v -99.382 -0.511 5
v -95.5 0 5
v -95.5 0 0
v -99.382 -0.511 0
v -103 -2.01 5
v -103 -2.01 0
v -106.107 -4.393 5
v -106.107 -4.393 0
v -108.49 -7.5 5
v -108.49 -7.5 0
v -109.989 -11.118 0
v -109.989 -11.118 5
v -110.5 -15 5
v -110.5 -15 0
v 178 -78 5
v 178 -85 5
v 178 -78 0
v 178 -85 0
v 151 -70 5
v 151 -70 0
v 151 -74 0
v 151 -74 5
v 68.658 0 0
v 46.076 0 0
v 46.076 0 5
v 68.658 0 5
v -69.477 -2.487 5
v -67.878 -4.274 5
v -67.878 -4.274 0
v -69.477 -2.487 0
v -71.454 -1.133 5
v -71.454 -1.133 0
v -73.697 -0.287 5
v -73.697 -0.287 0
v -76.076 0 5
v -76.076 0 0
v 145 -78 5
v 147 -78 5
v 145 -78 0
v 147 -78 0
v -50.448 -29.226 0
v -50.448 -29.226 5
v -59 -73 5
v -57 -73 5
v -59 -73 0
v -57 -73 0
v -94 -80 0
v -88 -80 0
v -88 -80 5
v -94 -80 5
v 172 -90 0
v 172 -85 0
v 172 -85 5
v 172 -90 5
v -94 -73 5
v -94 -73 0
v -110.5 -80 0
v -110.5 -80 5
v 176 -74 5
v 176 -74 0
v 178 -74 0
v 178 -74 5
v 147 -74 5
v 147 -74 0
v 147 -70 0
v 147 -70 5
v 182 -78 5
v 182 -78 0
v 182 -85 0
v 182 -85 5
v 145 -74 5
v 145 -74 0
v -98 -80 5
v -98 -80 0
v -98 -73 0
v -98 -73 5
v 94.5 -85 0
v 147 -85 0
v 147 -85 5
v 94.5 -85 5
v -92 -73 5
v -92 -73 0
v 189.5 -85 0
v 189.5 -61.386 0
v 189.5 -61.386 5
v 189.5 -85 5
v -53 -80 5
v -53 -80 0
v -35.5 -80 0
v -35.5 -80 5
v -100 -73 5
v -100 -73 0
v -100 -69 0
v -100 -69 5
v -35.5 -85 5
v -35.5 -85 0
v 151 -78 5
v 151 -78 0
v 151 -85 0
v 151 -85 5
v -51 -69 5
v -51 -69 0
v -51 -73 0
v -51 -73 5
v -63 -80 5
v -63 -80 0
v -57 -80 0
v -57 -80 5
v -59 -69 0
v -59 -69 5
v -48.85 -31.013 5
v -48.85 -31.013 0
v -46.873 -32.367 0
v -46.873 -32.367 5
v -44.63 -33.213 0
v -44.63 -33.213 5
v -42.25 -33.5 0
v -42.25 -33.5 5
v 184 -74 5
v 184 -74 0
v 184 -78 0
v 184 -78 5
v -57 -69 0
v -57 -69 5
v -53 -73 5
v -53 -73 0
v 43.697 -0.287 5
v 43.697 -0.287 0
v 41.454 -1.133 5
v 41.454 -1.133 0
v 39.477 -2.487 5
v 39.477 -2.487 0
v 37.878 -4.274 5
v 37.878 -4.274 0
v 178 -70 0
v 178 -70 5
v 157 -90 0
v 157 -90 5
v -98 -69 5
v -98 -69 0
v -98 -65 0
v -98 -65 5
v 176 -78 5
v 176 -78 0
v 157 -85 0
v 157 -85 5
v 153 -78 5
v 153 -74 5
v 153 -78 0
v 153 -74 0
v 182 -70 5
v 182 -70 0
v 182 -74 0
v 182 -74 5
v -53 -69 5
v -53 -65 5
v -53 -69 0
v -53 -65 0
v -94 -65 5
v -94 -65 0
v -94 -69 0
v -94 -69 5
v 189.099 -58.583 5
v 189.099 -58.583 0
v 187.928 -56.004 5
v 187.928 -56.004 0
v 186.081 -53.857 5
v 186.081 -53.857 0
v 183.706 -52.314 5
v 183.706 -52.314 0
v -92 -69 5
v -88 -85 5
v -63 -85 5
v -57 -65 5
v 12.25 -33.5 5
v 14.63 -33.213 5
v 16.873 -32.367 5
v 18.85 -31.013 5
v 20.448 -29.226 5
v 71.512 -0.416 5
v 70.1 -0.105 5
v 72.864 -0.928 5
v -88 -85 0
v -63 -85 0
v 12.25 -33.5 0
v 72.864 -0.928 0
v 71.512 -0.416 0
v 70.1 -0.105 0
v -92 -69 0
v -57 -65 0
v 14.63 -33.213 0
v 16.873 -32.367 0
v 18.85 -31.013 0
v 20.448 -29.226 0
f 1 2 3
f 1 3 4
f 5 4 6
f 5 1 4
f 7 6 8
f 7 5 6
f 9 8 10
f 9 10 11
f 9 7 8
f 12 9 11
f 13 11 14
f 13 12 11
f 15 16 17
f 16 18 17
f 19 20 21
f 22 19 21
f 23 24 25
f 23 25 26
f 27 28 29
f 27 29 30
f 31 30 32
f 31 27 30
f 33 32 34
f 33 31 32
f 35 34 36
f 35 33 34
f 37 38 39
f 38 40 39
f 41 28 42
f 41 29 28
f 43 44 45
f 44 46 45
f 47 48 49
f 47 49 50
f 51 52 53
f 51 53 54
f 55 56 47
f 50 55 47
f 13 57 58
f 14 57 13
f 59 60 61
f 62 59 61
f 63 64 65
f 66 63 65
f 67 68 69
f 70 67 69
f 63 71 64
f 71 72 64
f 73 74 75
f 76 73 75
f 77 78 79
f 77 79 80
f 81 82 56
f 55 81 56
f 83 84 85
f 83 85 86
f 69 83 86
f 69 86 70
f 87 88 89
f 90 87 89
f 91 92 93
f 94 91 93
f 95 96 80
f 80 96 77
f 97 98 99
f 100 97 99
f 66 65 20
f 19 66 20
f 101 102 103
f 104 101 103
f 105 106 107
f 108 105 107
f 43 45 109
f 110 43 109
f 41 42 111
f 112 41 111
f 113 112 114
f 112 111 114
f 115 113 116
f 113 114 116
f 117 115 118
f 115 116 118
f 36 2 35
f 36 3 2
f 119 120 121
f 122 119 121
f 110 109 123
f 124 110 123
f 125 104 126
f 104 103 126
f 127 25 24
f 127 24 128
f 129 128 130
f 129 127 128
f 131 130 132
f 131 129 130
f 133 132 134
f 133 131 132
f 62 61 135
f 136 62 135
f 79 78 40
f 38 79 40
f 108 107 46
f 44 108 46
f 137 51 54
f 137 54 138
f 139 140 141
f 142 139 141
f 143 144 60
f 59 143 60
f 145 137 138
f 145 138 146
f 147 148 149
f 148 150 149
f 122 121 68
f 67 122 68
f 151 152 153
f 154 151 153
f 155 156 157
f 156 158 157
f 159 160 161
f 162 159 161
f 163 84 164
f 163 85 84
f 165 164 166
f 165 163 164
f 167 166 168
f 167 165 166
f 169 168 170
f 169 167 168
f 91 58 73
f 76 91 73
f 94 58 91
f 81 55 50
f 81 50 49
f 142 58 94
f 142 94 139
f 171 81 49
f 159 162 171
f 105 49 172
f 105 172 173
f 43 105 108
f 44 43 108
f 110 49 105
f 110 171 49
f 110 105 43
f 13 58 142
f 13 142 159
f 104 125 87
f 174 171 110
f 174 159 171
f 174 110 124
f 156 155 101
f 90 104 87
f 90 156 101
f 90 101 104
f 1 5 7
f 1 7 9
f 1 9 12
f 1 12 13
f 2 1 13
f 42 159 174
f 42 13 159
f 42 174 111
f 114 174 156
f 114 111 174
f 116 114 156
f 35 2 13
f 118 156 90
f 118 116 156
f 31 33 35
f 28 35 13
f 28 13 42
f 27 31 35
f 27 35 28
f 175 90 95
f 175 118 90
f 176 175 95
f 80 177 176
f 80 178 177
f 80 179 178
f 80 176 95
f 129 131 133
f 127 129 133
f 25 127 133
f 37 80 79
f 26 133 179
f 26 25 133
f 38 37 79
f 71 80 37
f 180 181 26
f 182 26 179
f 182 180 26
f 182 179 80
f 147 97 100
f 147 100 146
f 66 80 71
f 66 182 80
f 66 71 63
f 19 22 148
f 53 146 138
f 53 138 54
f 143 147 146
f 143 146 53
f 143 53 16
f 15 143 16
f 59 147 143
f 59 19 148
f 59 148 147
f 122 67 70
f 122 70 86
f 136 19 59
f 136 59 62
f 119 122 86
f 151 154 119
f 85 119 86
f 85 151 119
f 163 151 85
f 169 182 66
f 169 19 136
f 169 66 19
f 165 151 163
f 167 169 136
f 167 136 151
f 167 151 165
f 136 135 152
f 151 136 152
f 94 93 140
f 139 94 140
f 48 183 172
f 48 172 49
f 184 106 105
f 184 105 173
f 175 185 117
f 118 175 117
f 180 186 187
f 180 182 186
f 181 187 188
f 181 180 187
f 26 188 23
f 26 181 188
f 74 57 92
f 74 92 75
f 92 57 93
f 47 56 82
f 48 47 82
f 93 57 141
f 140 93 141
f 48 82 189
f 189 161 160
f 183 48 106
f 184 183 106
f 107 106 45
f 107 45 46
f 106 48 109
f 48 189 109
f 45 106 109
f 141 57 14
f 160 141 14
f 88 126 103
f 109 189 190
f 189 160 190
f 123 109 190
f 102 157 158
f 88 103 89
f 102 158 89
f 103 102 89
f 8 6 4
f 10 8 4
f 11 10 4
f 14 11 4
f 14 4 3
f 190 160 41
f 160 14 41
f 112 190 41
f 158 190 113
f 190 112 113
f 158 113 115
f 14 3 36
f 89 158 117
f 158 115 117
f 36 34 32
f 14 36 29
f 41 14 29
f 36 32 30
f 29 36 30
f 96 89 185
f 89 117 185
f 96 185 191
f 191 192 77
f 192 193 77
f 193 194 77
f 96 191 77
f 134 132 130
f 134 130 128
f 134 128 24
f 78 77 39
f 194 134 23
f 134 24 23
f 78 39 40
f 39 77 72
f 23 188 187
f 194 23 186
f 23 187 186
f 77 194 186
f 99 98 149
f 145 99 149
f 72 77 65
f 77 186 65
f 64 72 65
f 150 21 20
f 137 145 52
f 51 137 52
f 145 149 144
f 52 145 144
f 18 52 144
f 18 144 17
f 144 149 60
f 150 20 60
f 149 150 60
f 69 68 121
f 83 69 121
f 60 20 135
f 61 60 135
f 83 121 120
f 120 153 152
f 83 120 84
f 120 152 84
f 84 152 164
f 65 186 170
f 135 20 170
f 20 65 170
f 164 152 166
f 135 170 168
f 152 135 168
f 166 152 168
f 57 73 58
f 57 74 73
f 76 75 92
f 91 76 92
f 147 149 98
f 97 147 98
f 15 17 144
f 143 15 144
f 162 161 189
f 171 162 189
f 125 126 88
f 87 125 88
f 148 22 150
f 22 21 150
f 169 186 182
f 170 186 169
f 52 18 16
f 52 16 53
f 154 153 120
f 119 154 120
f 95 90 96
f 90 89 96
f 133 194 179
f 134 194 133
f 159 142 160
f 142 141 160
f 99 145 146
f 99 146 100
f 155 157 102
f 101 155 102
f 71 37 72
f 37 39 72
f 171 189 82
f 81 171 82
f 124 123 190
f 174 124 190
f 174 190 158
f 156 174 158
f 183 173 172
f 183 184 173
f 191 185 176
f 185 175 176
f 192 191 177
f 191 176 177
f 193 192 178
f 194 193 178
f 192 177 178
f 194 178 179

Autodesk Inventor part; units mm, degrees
ref_plane "YZ Plane" through (0, 0, 0) normal (1, 0, 0) x (0, 1, 0)
ref_plane "XZ Plane" through (0, 0, 0) normal (0, 1, 0) x (-1, 0, 0)
ref_plane "XY Plane" through (0, 0, 0) normal (0, 0, 1) x (1, 0, 0)
sketch "Sketch1" plane through (0, 0, 0) normal (0, 0, 1) x (1, 0, 0)
  circle A0 centre (0, 0) radius 63.5 construction
  line L0 (0, 0) -> (-110.5, 0) construction
  line L1 (-110.5, 0) -> (-110.5, -80) construction
  line L2 (0, 0) -> (189.5, 0) construction
  line L3 (189.5, 0) -> (189.5, -85) construction
  line L4 (-88, -80) -> (-63, -80) construction
  line L5 (-63, -80) -> (-63, -85) construction
  line L6 (-63, -85) -> (-88, -85) construction
  line L7 (-88, -85) -> (-88, -80) construction
  line L8 (157, -85) -> (172, -85) construction
  line L9 (172, -85) -> (172, -90) construction
  line L10 (172, -90) -> (157, -90) construction
  line L11 (157, -90) -> (157, -85) construction
  circle A1 centre (0, 0) radius 33.5 construction
  line L12 (-35.5, -80) -> (134.5, -85) construction
  line L13 (0, 0) -> (0, -63.5) construction
  line L14 (-40.8636, 0) -> (0, -58.5) construction
  line L15 (40.8636, 0) -> (0, -58.5) construction
  line L16 (-63, -80) -> (-63, -85)
  line L17 (-63, -85) -> (-88, -85)
  line L18 (-88, -85) -> (-88, -80)
  line L19 (-110.5, -80) -> (-110.5, 0)
  line L20 (-110.5, 0) -> (-40.8636, 0) construction
  line L21 (-40.8636, 0) -> (0, -58.5) construction
  line L22 (0, -58.5) -> (40.8636, 0) construction
  line L23 (40.8636, 0) -> (189.5, 0) construction
  line L24 (189.5, 0) -> (189.5, -85) construction
  line L25 (172, -85) -> (172, -90)
  line L26 (172, -90) -> (157, -90)
  line L27 (157, -90) -> (157, -85)
  line L28 (-35.5, -80) -> (-35.5, -85)
  line L29 (-35.5, -85) -> (94.5, -85)
  line L30 (40.8636, 0) -> (70.8636, 0)
  line L31 (70.8636, 0) -> (189.5, -55)
  line L32 (189.5, -55) -> (189.5, -85)
  line L33 (151, -85) -> (145, -85) construction
  line L34 (172, -85) -> (178, -85) construction
  line L35 (151, -85) -> (149, -85) construction
  line L36 (147, -85) -> (147, -70) construction
  line L37 (147, -70) -> (151, -70) construction
  line L38 (151, -70) -> (151, -85) construction
  line L39 (149, -70) -> (149, -85) construction
  line L40 (145, -78) -> (153, -78) construction
  line L41 (153, -78) -> (153, -74) construction
  line L42 (153, -74) -> (145, -74) construction
  line L43 (145, -74) -> (145, -78) construction
  line L44 (145, -78) -> (153, -74) construction
  line L45 (153, -78) -> (145, -74) construction
  line L46 (180, -85) -> (182, -85) construction
  line L47 (182, -85) -> (182, -70) construction
  line L48 (182, -70) -> (178, -70) construction
  line L49 (178, -70) -> (178, -85) construction
  line L50 (180, -70) -> (180, -85) construction
  line L51 (184, -78) -> (176, -78) construction
  line L52 (176, -78) -> (176, -74) construction
  line L53 (176, -74) -> (184, -74) construction
  line L54 (184, -74) -> (184, -78) construction
  line L55 (184, -78) -> (176, -74) construction
  line L56 (176, -78) -> (184, -74) construction
  line L57 (147, -85) -> (147, -78) construction
  line L58 (147, -85) -> (147, -78)
  line L59 (147, -78) -> (145, -78)
  line L60 (145, -78) -> (145, -74)
  line L61 (145, -74) -> (147, -74)
  line L62 (147, -74) -> (147, -70)
  line L63 (147, -70) -> (151, -70)
  line L64 (151, -70) -> (151, -74)
  line L65 (151, -74) -> (153, -74)
  line L66 (153, -74) -> (153, -78)
  line L67 (153, -78) -> (151, -78)
  line L68 (151, -78) -> (151, -85)
  line L69 (147, -85) -> (134.5, -85) construction
  line L70 (157, -85) -> (151, -85)
  line L71 (147, -85) -> (94.5, -85)
  line L72 (178, -85) -> (178, -78)
  line L73 (178, -78) -> (176, -78)
  line L74 (176, -78) -> (176, -74)
  line L75 (176, -74) -> (178, -74)
  line L76 (178, -74) -> (178, -70)
  line L77 (178, -70) -> (182, -70)
  line L78 (182, -70) -> (182, -74)
  line L79 (182, -74) -> (184, -74)
  line L80 (184, -74) -> (184, -78)
  line L81 (184, -78) -> (182, -78)
  line L82 (182, -78) -> (182, -85)
  line L83 (189.5, -85) -> (180, -85) construction
  line L84 (178, -85) -> (149, -85) construction
  line L85 (189.5, -85) -> (182, -85)
  line L86 (178, -85) -> (172, -85)
  line L87 (-98, -80) -> (-98, -65) construction
  line L88 (-98, -65) -> (-94, -65) construction
  line L89 (-94, -65) -> (-94, -80) construction
  line L90 (-55, -80) -> (-53, -80) construction
  line L91 (-53, -80) -> (-53, -65) construction
  line L92 (-53, -65) -> (-57, -65) construction
  line L93 (-57, -65) -> (-57, -80) construction
  line L94 (-96, -65) -> (-96, -80) construction
  line L95 (-55, -65) -> (-55, -80) construction
  line L96 (-100, -73) -> (-92, -73) construction
  line L97 (-92, -73) -> (-92, -69) construction
  line L98 (-92, -69) -> (-100, -69) construction
  line L99 (-100, -69) -> (-100, -73) construction
  line L100 (-100, -73) -> (-92, -69) construction
  line L101 (-92, -73) -> (-100, -69) construction
  line L102 (-51, -73) -> (-59, -73) construction
  line L103 (-59, -73) -> (-59, -69) construction
  line L104 (-59, -69) -> (-51, -69) construction
  line L105 (-51, -69) -> (-51, -73) construction
  line L106 (-51, -73) -> (-59, -69) construction
  line L107 (-59, -73) -> (-51, -69) construction
  line L108 (-98, -80) -> (-98, -73)
  line L109 (-98, -73) -> (-100, -73)
  line L110 (-100, -73) -> (-100, -69)
  line L111 (-100, -69) -> (-98, -69)
  line L112 (-98, -69) -> (-98, -65)
  line L113 (-98, -65) -> (-94, -65)
  line L114 (-94, -65) -> (-94, -69)
  line L115 (-94, -69) -> (-92, -69)
  line L116 (-92, -69) -> (-92, -73)
  line L117 (-92, -73) -> (-94, -73)
  line L118 (-94, -73) -> (-94, -80)
  line L119 (-88, -80) -> (-94, -80)
  line L120 (-98, -80) -> (-110.5, -80)
  line L121 (-57, -80) -> (-57, -73)
  line L122 (-57, -73) -> (-59, -73)
  line L123 (-59, -73) -> (-59, -69)
  line L124 (-59, -69) -> (-57, -69)
  line L125 (-57, -69) -> (-57, -65)
  line L126 (-57, -65) -> (-53, -65)
  line L127 (-53, -65) -> (-53, -69)
  line L128 (-53, -69) -> (-51, -69)
  line L129 (-51, -69) -> (-51, -73)
  line L130 (-51, -73) -> (-53, -73)
  line L131 (-53, -73) -> (-53, -80)
  line L132 (-110.5, -80) -> (-57, -80) construction
  line L133 (-55, -80) -> (-35.5, -80) construction
  line L134 (-63, -80) -> (-57, -80)
  line L135 (-53, -80) -> (-35.5, -80)
  line L136 (0, -58.5) -> (-30, -58.5) construction
  line L137 (-30, -58.5) -> (-70.8636, 0) construction
  line L138 (-110.5, 0) -> (-70.8636, 0)
  line L139 (17.4631, -33.5) -> (-47.4631, -33.5)
  line L140 (-70.8636, 0) -> (-47.4631, -33.5)
  line L141 (17.4631, -33.5) -> (40.8636, 0)
  point P0 (149, -76)
  point P1 (180, -76)
  point P2 (-96, -71)
  point P3 (-55, -71)
  dimension "d0" = 127
  dimension "d1" = 110.5
  dimension "d2" = 80
  dimension "d3" = 75
  dimension "d4" = 189.5
  dimension "d5" = 85
  dimension "d6" = 55
  dimension "d7" = 25
  dimension "d8" = 5
  dimension "d9" = 27.5
  dimension "d10" = 15
  dimension "d11" = 5
  dimension "d13" = 67
  dimension "d14" = 5
  dimension "d19" = 30
  dimension "d20" = 30
  dimension "d21" = 17.5
  dimension "d23" = 6
  dimension "d24" = 4
  dimension "d25" = 15
  dimension "d26" = 8
  dimension "d27" = 4
  dimension "d29" = 4
  dimension "d30" = 8
  dimension "d32" = 6
  dimension "d33" = 4
  dimension "d34" = 15
  dimension "d35" = 6
  dimension "d36" = 4
  dimension "d37" = 15
  dimension "d38" = 6
  dimension "d39" = 8
  dimension "d40" = 4
  dimension "d41" = 8
  dimension "d44" = 7
  dimension "d45" = 7
  dimension "d46" = 12.5
  dimension "d47" = 30
extrude "Extrusion1" add sketch "Sketch1" along normal blind 5
fillet "Fillet1" radius 10 3 edges at (40.8636, 0, 2.5) (70.8636, 0, 2.5) (189.5, -55, 2.5)
fillet "Fillet2" radius 15 1 edges at (-110.5, 0, 2.5)
fillet "Fillet3" radius 10 3 edges at (-70.8636, 0, 2.5) (-47.4631, -33.5, 2.5) (17.4631, -33.5, 2.5)
properties part number "Soporte_Ambu_Izq"
